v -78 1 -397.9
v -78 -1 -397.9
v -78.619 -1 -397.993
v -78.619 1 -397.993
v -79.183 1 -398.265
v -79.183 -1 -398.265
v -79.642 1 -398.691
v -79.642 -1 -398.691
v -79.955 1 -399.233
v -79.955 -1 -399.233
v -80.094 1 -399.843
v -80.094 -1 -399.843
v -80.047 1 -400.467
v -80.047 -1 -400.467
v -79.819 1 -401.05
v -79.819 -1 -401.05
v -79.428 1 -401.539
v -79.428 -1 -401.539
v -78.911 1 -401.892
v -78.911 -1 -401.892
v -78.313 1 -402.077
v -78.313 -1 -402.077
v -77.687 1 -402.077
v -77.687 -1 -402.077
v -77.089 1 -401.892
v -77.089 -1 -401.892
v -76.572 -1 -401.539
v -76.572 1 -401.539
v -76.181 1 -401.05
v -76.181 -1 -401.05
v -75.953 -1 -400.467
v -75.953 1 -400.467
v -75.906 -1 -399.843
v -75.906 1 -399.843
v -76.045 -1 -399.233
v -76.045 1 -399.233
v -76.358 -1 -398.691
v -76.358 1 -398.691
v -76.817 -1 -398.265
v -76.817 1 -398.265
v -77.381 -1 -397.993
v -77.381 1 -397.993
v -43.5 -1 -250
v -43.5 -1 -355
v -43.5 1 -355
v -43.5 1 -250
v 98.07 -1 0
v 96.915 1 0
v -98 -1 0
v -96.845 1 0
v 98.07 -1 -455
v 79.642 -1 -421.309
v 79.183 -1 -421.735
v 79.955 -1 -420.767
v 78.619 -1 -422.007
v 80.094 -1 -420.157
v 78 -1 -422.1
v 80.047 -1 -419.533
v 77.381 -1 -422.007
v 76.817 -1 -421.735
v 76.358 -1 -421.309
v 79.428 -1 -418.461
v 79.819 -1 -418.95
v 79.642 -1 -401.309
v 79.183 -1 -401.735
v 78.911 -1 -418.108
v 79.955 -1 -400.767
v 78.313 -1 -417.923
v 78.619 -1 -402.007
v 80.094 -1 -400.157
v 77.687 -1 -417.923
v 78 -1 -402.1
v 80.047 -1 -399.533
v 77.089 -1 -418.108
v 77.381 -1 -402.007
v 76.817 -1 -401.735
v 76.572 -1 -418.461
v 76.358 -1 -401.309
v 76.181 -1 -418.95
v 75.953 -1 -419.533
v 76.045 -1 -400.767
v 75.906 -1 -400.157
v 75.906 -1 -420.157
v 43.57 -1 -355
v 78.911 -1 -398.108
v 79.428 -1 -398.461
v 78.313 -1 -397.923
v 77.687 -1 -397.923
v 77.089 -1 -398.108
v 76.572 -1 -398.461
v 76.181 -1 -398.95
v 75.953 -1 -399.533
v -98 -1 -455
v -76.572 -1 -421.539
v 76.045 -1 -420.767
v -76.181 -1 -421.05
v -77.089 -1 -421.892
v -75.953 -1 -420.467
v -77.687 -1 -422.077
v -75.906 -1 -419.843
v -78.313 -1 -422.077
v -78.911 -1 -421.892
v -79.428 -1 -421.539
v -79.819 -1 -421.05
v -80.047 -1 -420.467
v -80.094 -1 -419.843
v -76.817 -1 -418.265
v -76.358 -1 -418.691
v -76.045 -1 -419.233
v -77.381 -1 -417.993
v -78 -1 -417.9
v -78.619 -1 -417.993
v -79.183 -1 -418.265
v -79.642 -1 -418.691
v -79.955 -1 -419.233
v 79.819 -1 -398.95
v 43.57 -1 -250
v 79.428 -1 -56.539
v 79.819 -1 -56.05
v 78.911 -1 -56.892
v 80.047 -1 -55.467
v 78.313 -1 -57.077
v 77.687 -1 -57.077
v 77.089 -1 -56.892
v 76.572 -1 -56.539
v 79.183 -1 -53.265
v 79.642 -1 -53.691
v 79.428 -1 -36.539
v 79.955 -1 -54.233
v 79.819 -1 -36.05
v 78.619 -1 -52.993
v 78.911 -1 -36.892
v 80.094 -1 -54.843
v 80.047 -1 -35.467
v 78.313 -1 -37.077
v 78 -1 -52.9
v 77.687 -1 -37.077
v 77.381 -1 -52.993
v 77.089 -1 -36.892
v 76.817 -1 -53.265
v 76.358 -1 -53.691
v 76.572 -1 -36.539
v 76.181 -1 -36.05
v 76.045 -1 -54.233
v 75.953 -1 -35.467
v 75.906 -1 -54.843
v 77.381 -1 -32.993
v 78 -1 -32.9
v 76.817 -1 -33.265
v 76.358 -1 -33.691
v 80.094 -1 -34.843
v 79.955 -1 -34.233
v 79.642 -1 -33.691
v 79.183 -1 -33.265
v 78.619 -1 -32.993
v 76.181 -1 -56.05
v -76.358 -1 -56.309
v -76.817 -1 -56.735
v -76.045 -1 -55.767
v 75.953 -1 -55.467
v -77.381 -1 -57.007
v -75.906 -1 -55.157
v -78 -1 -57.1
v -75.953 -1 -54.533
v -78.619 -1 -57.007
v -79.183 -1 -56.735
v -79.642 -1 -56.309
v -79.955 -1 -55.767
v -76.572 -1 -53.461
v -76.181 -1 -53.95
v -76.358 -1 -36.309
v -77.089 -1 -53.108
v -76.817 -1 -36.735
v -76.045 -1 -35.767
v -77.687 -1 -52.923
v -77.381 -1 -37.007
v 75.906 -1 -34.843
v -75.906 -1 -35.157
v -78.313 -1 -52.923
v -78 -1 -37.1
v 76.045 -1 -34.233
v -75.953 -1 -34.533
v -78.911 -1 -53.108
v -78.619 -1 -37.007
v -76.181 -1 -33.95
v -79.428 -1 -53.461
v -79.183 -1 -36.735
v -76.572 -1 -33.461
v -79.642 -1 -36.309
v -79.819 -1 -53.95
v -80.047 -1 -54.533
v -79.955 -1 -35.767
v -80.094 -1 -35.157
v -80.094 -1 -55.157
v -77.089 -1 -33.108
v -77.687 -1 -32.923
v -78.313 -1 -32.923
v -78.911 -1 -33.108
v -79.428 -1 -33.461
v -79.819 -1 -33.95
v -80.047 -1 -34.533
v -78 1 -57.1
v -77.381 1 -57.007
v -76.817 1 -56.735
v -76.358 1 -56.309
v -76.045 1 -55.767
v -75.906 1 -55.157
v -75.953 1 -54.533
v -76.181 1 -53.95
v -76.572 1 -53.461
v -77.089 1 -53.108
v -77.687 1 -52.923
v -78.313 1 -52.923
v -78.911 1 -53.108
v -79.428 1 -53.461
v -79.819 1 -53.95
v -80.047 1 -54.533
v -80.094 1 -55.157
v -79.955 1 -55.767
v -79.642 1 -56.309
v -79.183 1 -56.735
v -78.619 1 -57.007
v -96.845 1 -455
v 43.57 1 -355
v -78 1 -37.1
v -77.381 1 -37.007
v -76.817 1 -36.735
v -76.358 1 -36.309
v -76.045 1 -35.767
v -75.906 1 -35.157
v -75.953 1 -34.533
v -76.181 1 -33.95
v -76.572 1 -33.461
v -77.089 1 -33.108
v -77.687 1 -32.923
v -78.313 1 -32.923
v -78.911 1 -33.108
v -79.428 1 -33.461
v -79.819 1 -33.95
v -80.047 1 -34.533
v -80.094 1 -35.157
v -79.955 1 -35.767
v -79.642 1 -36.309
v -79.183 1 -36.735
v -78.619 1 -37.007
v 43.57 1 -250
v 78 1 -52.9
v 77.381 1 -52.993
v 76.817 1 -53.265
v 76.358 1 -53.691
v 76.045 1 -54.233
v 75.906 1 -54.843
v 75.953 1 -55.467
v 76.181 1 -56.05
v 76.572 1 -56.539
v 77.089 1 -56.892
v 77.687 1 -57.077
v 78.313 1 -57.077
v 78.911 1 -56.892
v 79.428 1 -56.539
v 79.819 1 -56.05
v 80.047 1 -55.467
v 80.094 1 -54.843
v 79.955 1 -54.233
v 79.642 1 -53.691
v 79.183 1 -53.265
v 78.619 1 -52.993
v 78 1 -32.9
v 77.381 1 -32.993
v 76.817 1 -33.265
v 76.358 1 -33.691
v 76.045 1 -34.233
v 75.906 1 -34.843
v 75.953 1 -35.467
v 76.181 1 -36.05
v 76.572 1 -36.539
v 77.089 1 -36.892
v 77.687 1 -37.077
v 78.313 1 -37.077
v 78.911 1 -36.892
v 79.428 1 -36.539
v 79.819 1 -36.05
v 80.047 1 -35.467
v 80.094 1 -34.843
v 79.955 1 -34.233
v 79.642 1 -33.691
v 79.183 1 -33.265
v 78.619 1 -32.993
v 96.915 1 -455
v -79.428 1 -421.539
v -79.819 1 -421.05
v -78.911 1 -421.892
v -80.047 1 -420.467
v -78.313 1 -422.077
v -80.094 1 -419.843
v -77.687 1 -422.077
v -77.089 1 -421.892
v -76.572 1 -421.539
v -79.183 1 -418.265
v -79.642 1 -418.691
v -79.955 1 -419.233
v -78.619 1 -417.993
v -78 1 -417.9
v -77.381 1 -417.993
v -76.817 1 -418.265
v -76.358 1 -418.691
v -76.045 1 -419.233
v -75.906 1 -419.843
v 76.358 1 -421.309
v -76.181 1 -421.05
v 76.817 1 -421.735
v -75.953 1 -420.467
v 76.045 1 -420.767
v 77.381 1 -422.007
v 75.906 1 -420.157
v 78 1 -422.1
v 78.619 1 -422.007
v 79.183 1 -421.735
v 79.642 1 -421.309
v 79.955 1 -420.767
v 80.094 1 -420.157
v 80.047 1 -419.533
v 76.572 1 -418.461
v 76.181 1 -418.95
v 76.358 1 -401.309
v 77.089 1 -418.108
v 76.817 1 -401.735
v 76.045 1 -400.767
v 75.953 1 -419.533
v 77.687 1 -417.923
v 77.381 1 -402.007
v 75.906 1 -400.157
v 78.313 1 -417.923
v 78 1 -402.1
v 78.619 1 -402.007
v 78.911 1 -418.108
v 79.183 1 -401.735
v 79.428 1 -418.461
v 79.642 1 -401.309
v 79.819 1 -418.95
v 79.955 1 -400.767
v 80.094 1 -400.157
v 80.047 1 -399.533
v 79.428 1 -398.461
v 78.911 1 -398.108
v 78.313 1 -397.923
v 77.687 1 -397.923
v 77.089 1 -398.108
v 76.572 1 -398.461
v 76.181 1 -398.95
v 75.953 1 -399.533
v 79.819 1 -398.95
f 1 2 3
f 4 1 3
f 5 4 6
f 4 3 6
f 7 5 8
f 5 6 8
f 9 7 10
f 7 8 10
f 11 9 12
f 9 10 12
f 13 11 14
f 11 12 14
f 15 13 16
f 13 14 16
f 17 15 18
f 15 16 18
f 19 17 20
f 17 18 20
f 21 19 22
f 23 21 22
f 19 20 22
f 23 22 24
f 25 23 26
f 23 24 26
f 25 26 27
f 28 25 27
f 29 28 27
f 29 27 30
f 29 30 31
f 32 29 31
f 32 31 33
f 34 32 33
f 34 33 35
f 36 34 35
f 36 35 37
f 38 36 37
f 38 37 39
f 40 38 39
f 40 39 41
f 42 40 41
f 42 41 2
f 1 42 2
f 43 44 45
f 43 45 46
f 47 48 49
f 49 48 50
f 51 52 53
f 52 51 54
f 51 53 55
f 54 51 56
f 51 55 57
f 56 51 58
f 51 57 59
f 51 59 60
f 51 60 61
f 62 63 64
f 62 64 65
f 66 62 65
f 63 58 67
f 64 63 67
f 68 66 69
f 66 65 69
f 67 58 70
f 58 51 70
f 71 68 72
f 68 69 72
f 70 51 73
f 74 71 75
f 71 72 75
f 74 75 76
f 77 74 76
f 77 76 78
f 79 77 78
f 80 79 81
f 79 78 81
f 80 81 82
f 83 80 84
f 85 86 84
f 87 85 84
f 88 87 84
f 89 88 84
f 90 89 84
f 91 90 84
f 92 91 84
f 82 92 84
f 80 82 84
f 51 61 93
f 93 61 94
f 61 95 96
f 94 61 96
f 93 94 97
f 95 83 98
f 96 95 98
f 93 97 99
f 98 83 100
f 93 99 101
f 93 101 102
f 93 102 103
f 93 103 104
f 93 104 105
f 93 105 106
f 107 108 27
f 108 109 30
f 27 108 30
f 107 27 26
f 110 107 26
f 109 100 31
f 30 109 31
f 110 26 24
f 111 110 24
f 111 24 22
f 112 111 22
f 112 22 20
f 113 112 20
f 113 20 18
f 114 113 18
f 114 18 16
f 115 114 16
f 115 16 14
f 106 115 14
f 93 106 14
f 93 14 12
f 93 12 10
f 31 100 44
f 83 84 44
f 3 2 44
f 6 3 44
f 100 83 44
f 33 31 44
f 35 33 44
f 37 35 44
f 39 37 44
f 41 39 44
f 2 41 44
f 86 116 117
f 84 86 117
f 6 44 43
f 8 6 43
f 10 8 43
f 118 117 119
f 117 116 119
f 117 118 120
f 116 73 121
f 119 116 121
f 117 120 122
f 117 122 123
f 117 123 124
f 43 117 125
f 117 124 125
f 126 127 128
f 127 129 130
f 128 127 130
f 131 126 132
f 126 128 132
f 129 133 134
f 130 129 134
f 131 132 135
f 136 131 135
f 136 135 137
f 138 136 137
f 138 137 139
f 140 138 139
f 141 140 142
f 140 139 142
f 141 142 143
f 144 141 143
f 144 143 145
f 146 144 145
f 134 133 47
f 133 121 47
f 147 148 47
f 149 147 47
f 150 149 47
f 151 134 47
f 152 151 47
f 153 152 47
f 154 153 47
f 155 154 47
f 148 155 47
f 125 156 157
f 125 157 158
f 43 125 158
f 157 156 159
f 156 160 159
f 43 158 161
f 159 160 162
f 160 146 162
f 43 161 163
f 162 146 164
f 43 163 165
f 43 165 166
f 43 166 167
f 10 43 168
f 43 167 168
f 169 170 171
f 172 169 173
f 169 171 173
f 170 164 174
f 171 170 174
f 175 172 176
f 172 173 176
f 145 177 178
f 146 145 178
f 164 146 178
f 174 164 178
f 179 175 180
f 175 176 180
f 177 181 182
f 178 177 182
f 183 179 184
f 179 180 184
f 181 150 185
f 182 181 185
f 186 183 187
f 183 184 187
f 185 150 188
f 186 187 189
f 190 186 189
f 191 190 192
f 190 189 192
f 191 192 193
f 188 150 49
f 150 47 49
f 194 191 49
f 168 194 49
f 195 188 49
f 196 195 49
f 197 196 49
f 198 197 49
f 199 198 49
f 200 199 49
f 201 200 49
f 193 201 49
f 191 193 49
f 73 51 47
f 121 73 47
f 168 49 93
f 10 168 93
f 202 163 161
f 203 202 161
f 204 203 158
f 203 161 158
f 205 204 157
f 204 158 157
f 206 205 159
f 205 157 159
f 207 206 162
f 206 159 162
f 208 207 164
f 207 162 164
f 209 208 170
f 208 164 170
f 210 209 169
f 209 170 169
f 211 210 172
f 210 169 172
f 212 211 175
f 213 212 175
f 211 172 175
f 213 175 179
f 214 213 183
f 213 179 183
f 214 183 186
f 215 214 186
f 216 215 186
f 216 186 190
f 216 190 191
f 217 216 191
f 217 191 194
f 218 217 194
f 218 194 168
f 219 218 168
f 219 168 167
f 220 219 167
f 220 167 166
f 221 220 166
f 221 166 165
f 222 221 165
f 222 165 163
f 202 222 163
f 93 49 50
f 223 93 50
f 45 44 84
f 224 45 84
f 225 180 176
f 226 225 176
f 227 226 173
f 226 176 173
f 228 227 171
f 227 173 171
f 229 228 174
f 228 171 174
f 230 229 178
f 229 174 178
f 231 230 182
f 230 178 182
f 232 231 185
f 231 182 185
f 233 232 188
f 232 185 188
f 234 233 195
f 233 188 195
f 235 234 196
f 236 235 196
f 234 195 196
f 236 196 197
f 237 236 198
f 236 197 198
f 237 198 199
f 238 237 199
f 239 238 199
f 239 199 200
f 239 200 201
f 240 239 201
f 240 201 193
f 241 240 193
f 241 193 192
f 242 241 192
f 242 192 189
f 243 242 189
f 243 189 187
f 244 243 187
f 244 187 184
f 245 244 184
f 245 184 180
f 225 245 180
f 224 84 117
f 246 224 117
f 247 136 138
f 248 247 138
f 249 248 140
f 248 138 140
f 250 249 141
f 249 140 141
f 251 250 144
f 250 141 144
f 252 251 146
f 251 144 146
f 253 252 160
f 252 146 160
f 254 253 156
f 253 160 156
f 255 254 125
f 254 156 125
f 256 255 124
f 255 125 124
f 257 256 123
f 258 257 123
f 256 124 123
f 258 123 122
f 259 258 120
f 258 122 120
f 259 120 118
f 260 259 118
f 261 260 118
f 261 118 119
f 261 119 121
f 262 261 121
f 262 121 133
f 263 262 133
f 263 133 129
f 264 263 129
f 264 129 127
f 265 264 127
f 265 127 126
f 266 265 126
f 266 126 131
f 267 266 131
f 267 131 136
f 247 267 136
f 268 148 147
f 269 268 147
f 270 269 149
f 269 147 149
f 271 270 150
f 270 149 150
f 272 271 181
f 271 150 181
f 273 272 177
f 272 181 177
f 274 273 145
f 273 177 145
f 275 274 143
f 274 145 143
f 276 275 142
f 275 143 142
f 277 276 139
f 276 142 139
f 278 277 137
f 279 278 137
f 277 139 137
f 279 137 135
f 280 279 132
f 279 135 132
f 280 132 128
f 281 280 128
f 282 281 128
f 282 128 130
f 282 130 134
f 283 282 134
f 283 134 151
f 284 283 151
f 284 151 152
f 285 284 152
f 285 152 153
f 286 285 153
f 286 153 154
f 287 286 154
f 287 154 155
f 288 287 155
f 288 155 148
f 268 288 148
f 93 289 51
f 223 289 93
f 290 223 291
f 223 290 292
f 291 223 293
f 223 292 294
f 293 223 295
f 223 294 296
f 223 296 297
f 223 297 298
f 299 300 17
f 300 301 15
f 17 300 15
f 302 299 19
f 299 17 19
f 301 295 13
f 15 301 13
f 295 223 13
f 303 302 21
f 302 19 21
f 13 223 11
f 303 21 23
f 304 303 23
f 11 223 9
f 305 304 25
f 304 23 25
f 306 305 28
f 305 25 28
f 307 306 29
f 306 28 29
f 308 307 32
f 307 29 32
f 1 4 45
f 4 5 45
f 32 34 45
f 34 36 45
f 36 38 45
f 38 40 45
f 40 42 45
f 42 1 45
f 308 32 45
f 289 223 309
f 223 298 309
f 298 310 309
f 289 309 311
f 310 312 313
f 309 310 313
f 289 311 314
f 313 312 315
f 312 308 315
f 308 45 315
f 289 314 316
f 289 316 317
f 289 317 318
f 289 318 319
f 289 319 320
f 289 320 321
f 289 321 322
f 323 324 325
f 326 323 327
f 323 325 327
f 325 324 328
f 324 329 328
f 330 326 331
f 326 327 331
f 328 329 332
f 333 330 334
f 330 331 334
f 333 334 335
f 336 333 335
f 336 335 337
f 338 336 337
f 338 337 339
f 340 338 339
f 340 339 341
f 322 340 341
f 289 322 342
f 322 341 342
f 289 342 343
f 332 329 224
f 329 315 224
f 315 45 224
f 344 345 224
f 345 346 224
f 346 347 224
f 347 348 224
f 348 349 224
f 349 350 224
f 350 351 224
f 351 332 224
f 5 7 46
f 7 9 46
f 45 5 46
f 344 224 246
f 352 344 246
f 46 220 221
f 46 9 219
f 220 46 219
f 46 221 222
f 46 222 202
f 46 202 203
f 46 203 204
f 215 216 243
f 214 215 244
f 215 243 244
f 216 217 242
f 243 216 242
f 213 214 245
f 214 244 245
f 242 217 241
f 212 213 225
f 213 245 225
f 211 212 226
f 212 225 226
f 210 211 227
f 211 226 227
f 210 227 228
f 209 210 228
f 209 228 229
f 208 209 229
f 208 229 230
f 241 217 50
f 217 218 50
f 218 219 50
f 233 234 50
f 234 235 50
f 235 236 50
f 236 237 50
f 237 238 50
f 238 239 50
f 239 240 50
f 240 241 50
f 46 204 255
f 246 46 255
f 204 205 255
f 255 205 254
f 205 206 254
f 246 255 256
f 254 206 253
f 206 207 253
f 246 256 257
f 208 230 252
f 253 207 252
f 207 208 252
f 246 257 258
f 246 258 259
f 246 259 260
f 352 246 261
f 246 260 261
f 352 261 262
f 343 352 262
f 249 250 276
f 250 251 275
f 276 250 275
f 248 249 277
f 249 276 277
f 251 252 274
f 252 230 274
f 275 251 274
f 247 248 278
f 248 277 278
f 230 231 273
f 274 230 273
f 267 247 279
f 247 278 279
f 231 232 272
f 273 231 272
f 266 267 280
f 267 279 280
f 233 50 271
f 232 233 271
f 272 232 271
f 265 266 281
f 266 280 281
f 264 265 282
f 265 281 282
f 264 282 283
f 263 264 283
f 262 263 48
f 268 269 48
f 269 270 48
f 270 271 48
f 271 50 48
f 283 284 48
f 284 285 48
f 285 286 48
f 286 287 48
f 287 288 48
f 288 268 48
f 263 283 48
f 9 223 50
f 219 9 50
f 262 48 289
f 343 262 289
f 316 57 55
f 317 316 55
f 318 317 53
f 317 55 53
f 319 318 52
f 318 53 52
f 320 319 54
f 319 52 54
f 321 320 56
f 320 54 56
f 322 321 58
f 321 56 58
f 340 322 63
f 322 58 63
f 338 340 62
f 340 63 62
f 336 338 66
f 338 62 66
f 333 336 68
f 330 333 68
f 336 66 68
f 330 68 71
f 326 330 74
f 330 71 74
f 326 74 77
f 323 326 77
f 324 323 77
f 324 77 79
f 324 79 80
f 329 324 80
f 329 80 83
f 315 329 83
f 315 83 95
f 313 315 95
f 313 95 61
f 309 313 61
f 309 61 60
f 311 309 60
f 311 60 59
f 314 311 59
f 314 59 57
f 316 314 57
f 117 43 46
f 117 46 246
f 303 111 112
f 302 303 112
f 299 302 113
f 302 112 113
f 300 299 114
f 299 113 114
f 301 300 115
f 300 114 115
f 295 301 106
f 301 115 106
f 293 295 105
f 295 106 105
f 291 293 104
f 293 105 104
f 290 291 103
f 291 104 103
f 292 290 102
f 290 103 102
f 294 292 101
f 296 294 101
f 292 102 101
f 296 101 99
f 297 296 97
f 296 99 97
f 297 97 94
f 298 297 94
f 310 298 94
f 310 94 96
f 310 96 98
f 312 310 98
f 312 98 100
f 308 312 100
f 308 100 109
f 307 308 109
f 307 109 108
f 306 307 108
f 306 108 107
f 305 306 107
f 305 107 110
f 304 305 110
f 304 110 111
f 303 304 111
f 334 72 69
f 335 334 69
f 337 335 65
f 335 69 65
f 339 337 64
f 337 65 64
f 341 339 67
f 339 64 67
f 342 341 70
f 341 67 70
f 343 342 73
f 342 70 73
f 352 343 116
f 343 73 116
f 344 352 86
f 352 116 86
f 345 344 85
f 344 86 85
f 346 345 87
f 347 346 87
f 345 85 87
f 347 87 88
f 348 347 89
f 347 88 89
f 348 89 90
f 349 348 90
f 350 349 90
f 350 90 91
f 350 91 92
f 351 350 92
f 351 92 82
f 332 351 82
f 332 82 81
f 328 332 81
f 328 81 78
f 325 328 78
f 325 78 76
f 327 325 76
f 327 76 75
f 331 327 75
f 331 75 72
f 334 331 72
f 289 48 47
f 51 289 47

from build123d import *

# Parameters (mm, degrees)
EXTRUDE_1_DEPTH     = 455
SKETCH_3_R          = 2.1
CUT_EXTRUDE_1_DEPTH = 466.453246739
SKETCH_7_W          = 87.07
SKETCH_7_H          = 105
CUT_EXTRUDE_2_DEPTH = 10


with BuildPart() as part:
    # 草图2 → 凸台-拉伸1 (new body)
    with BuildSketch(Plane.XY):
        Polygon((-98, -1), (-96.845299462, 1), (96.915299462, 1), (98.07, -1), align=None)
    extrude(amount=-EXTRUDE_1_DEPTH)

    # 草图3 → 切除-拉伸1 (cut, through all)
    with BuildSketch(Plane(origin=(0, -1, 0), x_dir=(-1, 0, 0), z_dir=(0, -1, 0))):
        with Locations(Location((78, 35, 0), (0, 0, 90))):
            Circle(SKETCH_3_R)
        with Locations(Location((78, 55, 0), (0, 0, 90))):
            Circle(SKETCH_3_R)
        with Locations(Location((-78, 55, 0), (0, 0, 270))):
            Circle(SKETCH_3_R)
        with Locations(Location((-78, 35, 0), (0, 0, 270))):
            Circle(SKETCH_3_R)
        with Locations(Location((-78, 420, 0), (0, 0, 90))):
            Circle(SKETCH_3_R)
        with Locations(Location((-78, 400, 0), (0, 0, 90))):
            Circle(SKETCH_3_R)
        with Locations(Location((78, 400, 0), (0, 0, 270))):
            Circle(SKETCH_3_R)
        with Locations(Location((78, 420, 0), (0, 0, 270))):
            Circle(SKETCH_3_R)
    extrude(amount=-CUT_EXTRUDE_1_DEPTH, mode=Mode.SUBTRACT)

    # 草图7 → 切除-拉伸2 (cut)
    with BuildSketch(Plane.XZ.offset(1)):
        with Locations((0.035, -302.5)):
            Rectangle(SKETCH_7_W, SKETCH_7_H)
    extrude(amount=-CUT_EXTRUDE_2_DEPTH, mode=Mode.SUBTRACT)


solid = part.part
